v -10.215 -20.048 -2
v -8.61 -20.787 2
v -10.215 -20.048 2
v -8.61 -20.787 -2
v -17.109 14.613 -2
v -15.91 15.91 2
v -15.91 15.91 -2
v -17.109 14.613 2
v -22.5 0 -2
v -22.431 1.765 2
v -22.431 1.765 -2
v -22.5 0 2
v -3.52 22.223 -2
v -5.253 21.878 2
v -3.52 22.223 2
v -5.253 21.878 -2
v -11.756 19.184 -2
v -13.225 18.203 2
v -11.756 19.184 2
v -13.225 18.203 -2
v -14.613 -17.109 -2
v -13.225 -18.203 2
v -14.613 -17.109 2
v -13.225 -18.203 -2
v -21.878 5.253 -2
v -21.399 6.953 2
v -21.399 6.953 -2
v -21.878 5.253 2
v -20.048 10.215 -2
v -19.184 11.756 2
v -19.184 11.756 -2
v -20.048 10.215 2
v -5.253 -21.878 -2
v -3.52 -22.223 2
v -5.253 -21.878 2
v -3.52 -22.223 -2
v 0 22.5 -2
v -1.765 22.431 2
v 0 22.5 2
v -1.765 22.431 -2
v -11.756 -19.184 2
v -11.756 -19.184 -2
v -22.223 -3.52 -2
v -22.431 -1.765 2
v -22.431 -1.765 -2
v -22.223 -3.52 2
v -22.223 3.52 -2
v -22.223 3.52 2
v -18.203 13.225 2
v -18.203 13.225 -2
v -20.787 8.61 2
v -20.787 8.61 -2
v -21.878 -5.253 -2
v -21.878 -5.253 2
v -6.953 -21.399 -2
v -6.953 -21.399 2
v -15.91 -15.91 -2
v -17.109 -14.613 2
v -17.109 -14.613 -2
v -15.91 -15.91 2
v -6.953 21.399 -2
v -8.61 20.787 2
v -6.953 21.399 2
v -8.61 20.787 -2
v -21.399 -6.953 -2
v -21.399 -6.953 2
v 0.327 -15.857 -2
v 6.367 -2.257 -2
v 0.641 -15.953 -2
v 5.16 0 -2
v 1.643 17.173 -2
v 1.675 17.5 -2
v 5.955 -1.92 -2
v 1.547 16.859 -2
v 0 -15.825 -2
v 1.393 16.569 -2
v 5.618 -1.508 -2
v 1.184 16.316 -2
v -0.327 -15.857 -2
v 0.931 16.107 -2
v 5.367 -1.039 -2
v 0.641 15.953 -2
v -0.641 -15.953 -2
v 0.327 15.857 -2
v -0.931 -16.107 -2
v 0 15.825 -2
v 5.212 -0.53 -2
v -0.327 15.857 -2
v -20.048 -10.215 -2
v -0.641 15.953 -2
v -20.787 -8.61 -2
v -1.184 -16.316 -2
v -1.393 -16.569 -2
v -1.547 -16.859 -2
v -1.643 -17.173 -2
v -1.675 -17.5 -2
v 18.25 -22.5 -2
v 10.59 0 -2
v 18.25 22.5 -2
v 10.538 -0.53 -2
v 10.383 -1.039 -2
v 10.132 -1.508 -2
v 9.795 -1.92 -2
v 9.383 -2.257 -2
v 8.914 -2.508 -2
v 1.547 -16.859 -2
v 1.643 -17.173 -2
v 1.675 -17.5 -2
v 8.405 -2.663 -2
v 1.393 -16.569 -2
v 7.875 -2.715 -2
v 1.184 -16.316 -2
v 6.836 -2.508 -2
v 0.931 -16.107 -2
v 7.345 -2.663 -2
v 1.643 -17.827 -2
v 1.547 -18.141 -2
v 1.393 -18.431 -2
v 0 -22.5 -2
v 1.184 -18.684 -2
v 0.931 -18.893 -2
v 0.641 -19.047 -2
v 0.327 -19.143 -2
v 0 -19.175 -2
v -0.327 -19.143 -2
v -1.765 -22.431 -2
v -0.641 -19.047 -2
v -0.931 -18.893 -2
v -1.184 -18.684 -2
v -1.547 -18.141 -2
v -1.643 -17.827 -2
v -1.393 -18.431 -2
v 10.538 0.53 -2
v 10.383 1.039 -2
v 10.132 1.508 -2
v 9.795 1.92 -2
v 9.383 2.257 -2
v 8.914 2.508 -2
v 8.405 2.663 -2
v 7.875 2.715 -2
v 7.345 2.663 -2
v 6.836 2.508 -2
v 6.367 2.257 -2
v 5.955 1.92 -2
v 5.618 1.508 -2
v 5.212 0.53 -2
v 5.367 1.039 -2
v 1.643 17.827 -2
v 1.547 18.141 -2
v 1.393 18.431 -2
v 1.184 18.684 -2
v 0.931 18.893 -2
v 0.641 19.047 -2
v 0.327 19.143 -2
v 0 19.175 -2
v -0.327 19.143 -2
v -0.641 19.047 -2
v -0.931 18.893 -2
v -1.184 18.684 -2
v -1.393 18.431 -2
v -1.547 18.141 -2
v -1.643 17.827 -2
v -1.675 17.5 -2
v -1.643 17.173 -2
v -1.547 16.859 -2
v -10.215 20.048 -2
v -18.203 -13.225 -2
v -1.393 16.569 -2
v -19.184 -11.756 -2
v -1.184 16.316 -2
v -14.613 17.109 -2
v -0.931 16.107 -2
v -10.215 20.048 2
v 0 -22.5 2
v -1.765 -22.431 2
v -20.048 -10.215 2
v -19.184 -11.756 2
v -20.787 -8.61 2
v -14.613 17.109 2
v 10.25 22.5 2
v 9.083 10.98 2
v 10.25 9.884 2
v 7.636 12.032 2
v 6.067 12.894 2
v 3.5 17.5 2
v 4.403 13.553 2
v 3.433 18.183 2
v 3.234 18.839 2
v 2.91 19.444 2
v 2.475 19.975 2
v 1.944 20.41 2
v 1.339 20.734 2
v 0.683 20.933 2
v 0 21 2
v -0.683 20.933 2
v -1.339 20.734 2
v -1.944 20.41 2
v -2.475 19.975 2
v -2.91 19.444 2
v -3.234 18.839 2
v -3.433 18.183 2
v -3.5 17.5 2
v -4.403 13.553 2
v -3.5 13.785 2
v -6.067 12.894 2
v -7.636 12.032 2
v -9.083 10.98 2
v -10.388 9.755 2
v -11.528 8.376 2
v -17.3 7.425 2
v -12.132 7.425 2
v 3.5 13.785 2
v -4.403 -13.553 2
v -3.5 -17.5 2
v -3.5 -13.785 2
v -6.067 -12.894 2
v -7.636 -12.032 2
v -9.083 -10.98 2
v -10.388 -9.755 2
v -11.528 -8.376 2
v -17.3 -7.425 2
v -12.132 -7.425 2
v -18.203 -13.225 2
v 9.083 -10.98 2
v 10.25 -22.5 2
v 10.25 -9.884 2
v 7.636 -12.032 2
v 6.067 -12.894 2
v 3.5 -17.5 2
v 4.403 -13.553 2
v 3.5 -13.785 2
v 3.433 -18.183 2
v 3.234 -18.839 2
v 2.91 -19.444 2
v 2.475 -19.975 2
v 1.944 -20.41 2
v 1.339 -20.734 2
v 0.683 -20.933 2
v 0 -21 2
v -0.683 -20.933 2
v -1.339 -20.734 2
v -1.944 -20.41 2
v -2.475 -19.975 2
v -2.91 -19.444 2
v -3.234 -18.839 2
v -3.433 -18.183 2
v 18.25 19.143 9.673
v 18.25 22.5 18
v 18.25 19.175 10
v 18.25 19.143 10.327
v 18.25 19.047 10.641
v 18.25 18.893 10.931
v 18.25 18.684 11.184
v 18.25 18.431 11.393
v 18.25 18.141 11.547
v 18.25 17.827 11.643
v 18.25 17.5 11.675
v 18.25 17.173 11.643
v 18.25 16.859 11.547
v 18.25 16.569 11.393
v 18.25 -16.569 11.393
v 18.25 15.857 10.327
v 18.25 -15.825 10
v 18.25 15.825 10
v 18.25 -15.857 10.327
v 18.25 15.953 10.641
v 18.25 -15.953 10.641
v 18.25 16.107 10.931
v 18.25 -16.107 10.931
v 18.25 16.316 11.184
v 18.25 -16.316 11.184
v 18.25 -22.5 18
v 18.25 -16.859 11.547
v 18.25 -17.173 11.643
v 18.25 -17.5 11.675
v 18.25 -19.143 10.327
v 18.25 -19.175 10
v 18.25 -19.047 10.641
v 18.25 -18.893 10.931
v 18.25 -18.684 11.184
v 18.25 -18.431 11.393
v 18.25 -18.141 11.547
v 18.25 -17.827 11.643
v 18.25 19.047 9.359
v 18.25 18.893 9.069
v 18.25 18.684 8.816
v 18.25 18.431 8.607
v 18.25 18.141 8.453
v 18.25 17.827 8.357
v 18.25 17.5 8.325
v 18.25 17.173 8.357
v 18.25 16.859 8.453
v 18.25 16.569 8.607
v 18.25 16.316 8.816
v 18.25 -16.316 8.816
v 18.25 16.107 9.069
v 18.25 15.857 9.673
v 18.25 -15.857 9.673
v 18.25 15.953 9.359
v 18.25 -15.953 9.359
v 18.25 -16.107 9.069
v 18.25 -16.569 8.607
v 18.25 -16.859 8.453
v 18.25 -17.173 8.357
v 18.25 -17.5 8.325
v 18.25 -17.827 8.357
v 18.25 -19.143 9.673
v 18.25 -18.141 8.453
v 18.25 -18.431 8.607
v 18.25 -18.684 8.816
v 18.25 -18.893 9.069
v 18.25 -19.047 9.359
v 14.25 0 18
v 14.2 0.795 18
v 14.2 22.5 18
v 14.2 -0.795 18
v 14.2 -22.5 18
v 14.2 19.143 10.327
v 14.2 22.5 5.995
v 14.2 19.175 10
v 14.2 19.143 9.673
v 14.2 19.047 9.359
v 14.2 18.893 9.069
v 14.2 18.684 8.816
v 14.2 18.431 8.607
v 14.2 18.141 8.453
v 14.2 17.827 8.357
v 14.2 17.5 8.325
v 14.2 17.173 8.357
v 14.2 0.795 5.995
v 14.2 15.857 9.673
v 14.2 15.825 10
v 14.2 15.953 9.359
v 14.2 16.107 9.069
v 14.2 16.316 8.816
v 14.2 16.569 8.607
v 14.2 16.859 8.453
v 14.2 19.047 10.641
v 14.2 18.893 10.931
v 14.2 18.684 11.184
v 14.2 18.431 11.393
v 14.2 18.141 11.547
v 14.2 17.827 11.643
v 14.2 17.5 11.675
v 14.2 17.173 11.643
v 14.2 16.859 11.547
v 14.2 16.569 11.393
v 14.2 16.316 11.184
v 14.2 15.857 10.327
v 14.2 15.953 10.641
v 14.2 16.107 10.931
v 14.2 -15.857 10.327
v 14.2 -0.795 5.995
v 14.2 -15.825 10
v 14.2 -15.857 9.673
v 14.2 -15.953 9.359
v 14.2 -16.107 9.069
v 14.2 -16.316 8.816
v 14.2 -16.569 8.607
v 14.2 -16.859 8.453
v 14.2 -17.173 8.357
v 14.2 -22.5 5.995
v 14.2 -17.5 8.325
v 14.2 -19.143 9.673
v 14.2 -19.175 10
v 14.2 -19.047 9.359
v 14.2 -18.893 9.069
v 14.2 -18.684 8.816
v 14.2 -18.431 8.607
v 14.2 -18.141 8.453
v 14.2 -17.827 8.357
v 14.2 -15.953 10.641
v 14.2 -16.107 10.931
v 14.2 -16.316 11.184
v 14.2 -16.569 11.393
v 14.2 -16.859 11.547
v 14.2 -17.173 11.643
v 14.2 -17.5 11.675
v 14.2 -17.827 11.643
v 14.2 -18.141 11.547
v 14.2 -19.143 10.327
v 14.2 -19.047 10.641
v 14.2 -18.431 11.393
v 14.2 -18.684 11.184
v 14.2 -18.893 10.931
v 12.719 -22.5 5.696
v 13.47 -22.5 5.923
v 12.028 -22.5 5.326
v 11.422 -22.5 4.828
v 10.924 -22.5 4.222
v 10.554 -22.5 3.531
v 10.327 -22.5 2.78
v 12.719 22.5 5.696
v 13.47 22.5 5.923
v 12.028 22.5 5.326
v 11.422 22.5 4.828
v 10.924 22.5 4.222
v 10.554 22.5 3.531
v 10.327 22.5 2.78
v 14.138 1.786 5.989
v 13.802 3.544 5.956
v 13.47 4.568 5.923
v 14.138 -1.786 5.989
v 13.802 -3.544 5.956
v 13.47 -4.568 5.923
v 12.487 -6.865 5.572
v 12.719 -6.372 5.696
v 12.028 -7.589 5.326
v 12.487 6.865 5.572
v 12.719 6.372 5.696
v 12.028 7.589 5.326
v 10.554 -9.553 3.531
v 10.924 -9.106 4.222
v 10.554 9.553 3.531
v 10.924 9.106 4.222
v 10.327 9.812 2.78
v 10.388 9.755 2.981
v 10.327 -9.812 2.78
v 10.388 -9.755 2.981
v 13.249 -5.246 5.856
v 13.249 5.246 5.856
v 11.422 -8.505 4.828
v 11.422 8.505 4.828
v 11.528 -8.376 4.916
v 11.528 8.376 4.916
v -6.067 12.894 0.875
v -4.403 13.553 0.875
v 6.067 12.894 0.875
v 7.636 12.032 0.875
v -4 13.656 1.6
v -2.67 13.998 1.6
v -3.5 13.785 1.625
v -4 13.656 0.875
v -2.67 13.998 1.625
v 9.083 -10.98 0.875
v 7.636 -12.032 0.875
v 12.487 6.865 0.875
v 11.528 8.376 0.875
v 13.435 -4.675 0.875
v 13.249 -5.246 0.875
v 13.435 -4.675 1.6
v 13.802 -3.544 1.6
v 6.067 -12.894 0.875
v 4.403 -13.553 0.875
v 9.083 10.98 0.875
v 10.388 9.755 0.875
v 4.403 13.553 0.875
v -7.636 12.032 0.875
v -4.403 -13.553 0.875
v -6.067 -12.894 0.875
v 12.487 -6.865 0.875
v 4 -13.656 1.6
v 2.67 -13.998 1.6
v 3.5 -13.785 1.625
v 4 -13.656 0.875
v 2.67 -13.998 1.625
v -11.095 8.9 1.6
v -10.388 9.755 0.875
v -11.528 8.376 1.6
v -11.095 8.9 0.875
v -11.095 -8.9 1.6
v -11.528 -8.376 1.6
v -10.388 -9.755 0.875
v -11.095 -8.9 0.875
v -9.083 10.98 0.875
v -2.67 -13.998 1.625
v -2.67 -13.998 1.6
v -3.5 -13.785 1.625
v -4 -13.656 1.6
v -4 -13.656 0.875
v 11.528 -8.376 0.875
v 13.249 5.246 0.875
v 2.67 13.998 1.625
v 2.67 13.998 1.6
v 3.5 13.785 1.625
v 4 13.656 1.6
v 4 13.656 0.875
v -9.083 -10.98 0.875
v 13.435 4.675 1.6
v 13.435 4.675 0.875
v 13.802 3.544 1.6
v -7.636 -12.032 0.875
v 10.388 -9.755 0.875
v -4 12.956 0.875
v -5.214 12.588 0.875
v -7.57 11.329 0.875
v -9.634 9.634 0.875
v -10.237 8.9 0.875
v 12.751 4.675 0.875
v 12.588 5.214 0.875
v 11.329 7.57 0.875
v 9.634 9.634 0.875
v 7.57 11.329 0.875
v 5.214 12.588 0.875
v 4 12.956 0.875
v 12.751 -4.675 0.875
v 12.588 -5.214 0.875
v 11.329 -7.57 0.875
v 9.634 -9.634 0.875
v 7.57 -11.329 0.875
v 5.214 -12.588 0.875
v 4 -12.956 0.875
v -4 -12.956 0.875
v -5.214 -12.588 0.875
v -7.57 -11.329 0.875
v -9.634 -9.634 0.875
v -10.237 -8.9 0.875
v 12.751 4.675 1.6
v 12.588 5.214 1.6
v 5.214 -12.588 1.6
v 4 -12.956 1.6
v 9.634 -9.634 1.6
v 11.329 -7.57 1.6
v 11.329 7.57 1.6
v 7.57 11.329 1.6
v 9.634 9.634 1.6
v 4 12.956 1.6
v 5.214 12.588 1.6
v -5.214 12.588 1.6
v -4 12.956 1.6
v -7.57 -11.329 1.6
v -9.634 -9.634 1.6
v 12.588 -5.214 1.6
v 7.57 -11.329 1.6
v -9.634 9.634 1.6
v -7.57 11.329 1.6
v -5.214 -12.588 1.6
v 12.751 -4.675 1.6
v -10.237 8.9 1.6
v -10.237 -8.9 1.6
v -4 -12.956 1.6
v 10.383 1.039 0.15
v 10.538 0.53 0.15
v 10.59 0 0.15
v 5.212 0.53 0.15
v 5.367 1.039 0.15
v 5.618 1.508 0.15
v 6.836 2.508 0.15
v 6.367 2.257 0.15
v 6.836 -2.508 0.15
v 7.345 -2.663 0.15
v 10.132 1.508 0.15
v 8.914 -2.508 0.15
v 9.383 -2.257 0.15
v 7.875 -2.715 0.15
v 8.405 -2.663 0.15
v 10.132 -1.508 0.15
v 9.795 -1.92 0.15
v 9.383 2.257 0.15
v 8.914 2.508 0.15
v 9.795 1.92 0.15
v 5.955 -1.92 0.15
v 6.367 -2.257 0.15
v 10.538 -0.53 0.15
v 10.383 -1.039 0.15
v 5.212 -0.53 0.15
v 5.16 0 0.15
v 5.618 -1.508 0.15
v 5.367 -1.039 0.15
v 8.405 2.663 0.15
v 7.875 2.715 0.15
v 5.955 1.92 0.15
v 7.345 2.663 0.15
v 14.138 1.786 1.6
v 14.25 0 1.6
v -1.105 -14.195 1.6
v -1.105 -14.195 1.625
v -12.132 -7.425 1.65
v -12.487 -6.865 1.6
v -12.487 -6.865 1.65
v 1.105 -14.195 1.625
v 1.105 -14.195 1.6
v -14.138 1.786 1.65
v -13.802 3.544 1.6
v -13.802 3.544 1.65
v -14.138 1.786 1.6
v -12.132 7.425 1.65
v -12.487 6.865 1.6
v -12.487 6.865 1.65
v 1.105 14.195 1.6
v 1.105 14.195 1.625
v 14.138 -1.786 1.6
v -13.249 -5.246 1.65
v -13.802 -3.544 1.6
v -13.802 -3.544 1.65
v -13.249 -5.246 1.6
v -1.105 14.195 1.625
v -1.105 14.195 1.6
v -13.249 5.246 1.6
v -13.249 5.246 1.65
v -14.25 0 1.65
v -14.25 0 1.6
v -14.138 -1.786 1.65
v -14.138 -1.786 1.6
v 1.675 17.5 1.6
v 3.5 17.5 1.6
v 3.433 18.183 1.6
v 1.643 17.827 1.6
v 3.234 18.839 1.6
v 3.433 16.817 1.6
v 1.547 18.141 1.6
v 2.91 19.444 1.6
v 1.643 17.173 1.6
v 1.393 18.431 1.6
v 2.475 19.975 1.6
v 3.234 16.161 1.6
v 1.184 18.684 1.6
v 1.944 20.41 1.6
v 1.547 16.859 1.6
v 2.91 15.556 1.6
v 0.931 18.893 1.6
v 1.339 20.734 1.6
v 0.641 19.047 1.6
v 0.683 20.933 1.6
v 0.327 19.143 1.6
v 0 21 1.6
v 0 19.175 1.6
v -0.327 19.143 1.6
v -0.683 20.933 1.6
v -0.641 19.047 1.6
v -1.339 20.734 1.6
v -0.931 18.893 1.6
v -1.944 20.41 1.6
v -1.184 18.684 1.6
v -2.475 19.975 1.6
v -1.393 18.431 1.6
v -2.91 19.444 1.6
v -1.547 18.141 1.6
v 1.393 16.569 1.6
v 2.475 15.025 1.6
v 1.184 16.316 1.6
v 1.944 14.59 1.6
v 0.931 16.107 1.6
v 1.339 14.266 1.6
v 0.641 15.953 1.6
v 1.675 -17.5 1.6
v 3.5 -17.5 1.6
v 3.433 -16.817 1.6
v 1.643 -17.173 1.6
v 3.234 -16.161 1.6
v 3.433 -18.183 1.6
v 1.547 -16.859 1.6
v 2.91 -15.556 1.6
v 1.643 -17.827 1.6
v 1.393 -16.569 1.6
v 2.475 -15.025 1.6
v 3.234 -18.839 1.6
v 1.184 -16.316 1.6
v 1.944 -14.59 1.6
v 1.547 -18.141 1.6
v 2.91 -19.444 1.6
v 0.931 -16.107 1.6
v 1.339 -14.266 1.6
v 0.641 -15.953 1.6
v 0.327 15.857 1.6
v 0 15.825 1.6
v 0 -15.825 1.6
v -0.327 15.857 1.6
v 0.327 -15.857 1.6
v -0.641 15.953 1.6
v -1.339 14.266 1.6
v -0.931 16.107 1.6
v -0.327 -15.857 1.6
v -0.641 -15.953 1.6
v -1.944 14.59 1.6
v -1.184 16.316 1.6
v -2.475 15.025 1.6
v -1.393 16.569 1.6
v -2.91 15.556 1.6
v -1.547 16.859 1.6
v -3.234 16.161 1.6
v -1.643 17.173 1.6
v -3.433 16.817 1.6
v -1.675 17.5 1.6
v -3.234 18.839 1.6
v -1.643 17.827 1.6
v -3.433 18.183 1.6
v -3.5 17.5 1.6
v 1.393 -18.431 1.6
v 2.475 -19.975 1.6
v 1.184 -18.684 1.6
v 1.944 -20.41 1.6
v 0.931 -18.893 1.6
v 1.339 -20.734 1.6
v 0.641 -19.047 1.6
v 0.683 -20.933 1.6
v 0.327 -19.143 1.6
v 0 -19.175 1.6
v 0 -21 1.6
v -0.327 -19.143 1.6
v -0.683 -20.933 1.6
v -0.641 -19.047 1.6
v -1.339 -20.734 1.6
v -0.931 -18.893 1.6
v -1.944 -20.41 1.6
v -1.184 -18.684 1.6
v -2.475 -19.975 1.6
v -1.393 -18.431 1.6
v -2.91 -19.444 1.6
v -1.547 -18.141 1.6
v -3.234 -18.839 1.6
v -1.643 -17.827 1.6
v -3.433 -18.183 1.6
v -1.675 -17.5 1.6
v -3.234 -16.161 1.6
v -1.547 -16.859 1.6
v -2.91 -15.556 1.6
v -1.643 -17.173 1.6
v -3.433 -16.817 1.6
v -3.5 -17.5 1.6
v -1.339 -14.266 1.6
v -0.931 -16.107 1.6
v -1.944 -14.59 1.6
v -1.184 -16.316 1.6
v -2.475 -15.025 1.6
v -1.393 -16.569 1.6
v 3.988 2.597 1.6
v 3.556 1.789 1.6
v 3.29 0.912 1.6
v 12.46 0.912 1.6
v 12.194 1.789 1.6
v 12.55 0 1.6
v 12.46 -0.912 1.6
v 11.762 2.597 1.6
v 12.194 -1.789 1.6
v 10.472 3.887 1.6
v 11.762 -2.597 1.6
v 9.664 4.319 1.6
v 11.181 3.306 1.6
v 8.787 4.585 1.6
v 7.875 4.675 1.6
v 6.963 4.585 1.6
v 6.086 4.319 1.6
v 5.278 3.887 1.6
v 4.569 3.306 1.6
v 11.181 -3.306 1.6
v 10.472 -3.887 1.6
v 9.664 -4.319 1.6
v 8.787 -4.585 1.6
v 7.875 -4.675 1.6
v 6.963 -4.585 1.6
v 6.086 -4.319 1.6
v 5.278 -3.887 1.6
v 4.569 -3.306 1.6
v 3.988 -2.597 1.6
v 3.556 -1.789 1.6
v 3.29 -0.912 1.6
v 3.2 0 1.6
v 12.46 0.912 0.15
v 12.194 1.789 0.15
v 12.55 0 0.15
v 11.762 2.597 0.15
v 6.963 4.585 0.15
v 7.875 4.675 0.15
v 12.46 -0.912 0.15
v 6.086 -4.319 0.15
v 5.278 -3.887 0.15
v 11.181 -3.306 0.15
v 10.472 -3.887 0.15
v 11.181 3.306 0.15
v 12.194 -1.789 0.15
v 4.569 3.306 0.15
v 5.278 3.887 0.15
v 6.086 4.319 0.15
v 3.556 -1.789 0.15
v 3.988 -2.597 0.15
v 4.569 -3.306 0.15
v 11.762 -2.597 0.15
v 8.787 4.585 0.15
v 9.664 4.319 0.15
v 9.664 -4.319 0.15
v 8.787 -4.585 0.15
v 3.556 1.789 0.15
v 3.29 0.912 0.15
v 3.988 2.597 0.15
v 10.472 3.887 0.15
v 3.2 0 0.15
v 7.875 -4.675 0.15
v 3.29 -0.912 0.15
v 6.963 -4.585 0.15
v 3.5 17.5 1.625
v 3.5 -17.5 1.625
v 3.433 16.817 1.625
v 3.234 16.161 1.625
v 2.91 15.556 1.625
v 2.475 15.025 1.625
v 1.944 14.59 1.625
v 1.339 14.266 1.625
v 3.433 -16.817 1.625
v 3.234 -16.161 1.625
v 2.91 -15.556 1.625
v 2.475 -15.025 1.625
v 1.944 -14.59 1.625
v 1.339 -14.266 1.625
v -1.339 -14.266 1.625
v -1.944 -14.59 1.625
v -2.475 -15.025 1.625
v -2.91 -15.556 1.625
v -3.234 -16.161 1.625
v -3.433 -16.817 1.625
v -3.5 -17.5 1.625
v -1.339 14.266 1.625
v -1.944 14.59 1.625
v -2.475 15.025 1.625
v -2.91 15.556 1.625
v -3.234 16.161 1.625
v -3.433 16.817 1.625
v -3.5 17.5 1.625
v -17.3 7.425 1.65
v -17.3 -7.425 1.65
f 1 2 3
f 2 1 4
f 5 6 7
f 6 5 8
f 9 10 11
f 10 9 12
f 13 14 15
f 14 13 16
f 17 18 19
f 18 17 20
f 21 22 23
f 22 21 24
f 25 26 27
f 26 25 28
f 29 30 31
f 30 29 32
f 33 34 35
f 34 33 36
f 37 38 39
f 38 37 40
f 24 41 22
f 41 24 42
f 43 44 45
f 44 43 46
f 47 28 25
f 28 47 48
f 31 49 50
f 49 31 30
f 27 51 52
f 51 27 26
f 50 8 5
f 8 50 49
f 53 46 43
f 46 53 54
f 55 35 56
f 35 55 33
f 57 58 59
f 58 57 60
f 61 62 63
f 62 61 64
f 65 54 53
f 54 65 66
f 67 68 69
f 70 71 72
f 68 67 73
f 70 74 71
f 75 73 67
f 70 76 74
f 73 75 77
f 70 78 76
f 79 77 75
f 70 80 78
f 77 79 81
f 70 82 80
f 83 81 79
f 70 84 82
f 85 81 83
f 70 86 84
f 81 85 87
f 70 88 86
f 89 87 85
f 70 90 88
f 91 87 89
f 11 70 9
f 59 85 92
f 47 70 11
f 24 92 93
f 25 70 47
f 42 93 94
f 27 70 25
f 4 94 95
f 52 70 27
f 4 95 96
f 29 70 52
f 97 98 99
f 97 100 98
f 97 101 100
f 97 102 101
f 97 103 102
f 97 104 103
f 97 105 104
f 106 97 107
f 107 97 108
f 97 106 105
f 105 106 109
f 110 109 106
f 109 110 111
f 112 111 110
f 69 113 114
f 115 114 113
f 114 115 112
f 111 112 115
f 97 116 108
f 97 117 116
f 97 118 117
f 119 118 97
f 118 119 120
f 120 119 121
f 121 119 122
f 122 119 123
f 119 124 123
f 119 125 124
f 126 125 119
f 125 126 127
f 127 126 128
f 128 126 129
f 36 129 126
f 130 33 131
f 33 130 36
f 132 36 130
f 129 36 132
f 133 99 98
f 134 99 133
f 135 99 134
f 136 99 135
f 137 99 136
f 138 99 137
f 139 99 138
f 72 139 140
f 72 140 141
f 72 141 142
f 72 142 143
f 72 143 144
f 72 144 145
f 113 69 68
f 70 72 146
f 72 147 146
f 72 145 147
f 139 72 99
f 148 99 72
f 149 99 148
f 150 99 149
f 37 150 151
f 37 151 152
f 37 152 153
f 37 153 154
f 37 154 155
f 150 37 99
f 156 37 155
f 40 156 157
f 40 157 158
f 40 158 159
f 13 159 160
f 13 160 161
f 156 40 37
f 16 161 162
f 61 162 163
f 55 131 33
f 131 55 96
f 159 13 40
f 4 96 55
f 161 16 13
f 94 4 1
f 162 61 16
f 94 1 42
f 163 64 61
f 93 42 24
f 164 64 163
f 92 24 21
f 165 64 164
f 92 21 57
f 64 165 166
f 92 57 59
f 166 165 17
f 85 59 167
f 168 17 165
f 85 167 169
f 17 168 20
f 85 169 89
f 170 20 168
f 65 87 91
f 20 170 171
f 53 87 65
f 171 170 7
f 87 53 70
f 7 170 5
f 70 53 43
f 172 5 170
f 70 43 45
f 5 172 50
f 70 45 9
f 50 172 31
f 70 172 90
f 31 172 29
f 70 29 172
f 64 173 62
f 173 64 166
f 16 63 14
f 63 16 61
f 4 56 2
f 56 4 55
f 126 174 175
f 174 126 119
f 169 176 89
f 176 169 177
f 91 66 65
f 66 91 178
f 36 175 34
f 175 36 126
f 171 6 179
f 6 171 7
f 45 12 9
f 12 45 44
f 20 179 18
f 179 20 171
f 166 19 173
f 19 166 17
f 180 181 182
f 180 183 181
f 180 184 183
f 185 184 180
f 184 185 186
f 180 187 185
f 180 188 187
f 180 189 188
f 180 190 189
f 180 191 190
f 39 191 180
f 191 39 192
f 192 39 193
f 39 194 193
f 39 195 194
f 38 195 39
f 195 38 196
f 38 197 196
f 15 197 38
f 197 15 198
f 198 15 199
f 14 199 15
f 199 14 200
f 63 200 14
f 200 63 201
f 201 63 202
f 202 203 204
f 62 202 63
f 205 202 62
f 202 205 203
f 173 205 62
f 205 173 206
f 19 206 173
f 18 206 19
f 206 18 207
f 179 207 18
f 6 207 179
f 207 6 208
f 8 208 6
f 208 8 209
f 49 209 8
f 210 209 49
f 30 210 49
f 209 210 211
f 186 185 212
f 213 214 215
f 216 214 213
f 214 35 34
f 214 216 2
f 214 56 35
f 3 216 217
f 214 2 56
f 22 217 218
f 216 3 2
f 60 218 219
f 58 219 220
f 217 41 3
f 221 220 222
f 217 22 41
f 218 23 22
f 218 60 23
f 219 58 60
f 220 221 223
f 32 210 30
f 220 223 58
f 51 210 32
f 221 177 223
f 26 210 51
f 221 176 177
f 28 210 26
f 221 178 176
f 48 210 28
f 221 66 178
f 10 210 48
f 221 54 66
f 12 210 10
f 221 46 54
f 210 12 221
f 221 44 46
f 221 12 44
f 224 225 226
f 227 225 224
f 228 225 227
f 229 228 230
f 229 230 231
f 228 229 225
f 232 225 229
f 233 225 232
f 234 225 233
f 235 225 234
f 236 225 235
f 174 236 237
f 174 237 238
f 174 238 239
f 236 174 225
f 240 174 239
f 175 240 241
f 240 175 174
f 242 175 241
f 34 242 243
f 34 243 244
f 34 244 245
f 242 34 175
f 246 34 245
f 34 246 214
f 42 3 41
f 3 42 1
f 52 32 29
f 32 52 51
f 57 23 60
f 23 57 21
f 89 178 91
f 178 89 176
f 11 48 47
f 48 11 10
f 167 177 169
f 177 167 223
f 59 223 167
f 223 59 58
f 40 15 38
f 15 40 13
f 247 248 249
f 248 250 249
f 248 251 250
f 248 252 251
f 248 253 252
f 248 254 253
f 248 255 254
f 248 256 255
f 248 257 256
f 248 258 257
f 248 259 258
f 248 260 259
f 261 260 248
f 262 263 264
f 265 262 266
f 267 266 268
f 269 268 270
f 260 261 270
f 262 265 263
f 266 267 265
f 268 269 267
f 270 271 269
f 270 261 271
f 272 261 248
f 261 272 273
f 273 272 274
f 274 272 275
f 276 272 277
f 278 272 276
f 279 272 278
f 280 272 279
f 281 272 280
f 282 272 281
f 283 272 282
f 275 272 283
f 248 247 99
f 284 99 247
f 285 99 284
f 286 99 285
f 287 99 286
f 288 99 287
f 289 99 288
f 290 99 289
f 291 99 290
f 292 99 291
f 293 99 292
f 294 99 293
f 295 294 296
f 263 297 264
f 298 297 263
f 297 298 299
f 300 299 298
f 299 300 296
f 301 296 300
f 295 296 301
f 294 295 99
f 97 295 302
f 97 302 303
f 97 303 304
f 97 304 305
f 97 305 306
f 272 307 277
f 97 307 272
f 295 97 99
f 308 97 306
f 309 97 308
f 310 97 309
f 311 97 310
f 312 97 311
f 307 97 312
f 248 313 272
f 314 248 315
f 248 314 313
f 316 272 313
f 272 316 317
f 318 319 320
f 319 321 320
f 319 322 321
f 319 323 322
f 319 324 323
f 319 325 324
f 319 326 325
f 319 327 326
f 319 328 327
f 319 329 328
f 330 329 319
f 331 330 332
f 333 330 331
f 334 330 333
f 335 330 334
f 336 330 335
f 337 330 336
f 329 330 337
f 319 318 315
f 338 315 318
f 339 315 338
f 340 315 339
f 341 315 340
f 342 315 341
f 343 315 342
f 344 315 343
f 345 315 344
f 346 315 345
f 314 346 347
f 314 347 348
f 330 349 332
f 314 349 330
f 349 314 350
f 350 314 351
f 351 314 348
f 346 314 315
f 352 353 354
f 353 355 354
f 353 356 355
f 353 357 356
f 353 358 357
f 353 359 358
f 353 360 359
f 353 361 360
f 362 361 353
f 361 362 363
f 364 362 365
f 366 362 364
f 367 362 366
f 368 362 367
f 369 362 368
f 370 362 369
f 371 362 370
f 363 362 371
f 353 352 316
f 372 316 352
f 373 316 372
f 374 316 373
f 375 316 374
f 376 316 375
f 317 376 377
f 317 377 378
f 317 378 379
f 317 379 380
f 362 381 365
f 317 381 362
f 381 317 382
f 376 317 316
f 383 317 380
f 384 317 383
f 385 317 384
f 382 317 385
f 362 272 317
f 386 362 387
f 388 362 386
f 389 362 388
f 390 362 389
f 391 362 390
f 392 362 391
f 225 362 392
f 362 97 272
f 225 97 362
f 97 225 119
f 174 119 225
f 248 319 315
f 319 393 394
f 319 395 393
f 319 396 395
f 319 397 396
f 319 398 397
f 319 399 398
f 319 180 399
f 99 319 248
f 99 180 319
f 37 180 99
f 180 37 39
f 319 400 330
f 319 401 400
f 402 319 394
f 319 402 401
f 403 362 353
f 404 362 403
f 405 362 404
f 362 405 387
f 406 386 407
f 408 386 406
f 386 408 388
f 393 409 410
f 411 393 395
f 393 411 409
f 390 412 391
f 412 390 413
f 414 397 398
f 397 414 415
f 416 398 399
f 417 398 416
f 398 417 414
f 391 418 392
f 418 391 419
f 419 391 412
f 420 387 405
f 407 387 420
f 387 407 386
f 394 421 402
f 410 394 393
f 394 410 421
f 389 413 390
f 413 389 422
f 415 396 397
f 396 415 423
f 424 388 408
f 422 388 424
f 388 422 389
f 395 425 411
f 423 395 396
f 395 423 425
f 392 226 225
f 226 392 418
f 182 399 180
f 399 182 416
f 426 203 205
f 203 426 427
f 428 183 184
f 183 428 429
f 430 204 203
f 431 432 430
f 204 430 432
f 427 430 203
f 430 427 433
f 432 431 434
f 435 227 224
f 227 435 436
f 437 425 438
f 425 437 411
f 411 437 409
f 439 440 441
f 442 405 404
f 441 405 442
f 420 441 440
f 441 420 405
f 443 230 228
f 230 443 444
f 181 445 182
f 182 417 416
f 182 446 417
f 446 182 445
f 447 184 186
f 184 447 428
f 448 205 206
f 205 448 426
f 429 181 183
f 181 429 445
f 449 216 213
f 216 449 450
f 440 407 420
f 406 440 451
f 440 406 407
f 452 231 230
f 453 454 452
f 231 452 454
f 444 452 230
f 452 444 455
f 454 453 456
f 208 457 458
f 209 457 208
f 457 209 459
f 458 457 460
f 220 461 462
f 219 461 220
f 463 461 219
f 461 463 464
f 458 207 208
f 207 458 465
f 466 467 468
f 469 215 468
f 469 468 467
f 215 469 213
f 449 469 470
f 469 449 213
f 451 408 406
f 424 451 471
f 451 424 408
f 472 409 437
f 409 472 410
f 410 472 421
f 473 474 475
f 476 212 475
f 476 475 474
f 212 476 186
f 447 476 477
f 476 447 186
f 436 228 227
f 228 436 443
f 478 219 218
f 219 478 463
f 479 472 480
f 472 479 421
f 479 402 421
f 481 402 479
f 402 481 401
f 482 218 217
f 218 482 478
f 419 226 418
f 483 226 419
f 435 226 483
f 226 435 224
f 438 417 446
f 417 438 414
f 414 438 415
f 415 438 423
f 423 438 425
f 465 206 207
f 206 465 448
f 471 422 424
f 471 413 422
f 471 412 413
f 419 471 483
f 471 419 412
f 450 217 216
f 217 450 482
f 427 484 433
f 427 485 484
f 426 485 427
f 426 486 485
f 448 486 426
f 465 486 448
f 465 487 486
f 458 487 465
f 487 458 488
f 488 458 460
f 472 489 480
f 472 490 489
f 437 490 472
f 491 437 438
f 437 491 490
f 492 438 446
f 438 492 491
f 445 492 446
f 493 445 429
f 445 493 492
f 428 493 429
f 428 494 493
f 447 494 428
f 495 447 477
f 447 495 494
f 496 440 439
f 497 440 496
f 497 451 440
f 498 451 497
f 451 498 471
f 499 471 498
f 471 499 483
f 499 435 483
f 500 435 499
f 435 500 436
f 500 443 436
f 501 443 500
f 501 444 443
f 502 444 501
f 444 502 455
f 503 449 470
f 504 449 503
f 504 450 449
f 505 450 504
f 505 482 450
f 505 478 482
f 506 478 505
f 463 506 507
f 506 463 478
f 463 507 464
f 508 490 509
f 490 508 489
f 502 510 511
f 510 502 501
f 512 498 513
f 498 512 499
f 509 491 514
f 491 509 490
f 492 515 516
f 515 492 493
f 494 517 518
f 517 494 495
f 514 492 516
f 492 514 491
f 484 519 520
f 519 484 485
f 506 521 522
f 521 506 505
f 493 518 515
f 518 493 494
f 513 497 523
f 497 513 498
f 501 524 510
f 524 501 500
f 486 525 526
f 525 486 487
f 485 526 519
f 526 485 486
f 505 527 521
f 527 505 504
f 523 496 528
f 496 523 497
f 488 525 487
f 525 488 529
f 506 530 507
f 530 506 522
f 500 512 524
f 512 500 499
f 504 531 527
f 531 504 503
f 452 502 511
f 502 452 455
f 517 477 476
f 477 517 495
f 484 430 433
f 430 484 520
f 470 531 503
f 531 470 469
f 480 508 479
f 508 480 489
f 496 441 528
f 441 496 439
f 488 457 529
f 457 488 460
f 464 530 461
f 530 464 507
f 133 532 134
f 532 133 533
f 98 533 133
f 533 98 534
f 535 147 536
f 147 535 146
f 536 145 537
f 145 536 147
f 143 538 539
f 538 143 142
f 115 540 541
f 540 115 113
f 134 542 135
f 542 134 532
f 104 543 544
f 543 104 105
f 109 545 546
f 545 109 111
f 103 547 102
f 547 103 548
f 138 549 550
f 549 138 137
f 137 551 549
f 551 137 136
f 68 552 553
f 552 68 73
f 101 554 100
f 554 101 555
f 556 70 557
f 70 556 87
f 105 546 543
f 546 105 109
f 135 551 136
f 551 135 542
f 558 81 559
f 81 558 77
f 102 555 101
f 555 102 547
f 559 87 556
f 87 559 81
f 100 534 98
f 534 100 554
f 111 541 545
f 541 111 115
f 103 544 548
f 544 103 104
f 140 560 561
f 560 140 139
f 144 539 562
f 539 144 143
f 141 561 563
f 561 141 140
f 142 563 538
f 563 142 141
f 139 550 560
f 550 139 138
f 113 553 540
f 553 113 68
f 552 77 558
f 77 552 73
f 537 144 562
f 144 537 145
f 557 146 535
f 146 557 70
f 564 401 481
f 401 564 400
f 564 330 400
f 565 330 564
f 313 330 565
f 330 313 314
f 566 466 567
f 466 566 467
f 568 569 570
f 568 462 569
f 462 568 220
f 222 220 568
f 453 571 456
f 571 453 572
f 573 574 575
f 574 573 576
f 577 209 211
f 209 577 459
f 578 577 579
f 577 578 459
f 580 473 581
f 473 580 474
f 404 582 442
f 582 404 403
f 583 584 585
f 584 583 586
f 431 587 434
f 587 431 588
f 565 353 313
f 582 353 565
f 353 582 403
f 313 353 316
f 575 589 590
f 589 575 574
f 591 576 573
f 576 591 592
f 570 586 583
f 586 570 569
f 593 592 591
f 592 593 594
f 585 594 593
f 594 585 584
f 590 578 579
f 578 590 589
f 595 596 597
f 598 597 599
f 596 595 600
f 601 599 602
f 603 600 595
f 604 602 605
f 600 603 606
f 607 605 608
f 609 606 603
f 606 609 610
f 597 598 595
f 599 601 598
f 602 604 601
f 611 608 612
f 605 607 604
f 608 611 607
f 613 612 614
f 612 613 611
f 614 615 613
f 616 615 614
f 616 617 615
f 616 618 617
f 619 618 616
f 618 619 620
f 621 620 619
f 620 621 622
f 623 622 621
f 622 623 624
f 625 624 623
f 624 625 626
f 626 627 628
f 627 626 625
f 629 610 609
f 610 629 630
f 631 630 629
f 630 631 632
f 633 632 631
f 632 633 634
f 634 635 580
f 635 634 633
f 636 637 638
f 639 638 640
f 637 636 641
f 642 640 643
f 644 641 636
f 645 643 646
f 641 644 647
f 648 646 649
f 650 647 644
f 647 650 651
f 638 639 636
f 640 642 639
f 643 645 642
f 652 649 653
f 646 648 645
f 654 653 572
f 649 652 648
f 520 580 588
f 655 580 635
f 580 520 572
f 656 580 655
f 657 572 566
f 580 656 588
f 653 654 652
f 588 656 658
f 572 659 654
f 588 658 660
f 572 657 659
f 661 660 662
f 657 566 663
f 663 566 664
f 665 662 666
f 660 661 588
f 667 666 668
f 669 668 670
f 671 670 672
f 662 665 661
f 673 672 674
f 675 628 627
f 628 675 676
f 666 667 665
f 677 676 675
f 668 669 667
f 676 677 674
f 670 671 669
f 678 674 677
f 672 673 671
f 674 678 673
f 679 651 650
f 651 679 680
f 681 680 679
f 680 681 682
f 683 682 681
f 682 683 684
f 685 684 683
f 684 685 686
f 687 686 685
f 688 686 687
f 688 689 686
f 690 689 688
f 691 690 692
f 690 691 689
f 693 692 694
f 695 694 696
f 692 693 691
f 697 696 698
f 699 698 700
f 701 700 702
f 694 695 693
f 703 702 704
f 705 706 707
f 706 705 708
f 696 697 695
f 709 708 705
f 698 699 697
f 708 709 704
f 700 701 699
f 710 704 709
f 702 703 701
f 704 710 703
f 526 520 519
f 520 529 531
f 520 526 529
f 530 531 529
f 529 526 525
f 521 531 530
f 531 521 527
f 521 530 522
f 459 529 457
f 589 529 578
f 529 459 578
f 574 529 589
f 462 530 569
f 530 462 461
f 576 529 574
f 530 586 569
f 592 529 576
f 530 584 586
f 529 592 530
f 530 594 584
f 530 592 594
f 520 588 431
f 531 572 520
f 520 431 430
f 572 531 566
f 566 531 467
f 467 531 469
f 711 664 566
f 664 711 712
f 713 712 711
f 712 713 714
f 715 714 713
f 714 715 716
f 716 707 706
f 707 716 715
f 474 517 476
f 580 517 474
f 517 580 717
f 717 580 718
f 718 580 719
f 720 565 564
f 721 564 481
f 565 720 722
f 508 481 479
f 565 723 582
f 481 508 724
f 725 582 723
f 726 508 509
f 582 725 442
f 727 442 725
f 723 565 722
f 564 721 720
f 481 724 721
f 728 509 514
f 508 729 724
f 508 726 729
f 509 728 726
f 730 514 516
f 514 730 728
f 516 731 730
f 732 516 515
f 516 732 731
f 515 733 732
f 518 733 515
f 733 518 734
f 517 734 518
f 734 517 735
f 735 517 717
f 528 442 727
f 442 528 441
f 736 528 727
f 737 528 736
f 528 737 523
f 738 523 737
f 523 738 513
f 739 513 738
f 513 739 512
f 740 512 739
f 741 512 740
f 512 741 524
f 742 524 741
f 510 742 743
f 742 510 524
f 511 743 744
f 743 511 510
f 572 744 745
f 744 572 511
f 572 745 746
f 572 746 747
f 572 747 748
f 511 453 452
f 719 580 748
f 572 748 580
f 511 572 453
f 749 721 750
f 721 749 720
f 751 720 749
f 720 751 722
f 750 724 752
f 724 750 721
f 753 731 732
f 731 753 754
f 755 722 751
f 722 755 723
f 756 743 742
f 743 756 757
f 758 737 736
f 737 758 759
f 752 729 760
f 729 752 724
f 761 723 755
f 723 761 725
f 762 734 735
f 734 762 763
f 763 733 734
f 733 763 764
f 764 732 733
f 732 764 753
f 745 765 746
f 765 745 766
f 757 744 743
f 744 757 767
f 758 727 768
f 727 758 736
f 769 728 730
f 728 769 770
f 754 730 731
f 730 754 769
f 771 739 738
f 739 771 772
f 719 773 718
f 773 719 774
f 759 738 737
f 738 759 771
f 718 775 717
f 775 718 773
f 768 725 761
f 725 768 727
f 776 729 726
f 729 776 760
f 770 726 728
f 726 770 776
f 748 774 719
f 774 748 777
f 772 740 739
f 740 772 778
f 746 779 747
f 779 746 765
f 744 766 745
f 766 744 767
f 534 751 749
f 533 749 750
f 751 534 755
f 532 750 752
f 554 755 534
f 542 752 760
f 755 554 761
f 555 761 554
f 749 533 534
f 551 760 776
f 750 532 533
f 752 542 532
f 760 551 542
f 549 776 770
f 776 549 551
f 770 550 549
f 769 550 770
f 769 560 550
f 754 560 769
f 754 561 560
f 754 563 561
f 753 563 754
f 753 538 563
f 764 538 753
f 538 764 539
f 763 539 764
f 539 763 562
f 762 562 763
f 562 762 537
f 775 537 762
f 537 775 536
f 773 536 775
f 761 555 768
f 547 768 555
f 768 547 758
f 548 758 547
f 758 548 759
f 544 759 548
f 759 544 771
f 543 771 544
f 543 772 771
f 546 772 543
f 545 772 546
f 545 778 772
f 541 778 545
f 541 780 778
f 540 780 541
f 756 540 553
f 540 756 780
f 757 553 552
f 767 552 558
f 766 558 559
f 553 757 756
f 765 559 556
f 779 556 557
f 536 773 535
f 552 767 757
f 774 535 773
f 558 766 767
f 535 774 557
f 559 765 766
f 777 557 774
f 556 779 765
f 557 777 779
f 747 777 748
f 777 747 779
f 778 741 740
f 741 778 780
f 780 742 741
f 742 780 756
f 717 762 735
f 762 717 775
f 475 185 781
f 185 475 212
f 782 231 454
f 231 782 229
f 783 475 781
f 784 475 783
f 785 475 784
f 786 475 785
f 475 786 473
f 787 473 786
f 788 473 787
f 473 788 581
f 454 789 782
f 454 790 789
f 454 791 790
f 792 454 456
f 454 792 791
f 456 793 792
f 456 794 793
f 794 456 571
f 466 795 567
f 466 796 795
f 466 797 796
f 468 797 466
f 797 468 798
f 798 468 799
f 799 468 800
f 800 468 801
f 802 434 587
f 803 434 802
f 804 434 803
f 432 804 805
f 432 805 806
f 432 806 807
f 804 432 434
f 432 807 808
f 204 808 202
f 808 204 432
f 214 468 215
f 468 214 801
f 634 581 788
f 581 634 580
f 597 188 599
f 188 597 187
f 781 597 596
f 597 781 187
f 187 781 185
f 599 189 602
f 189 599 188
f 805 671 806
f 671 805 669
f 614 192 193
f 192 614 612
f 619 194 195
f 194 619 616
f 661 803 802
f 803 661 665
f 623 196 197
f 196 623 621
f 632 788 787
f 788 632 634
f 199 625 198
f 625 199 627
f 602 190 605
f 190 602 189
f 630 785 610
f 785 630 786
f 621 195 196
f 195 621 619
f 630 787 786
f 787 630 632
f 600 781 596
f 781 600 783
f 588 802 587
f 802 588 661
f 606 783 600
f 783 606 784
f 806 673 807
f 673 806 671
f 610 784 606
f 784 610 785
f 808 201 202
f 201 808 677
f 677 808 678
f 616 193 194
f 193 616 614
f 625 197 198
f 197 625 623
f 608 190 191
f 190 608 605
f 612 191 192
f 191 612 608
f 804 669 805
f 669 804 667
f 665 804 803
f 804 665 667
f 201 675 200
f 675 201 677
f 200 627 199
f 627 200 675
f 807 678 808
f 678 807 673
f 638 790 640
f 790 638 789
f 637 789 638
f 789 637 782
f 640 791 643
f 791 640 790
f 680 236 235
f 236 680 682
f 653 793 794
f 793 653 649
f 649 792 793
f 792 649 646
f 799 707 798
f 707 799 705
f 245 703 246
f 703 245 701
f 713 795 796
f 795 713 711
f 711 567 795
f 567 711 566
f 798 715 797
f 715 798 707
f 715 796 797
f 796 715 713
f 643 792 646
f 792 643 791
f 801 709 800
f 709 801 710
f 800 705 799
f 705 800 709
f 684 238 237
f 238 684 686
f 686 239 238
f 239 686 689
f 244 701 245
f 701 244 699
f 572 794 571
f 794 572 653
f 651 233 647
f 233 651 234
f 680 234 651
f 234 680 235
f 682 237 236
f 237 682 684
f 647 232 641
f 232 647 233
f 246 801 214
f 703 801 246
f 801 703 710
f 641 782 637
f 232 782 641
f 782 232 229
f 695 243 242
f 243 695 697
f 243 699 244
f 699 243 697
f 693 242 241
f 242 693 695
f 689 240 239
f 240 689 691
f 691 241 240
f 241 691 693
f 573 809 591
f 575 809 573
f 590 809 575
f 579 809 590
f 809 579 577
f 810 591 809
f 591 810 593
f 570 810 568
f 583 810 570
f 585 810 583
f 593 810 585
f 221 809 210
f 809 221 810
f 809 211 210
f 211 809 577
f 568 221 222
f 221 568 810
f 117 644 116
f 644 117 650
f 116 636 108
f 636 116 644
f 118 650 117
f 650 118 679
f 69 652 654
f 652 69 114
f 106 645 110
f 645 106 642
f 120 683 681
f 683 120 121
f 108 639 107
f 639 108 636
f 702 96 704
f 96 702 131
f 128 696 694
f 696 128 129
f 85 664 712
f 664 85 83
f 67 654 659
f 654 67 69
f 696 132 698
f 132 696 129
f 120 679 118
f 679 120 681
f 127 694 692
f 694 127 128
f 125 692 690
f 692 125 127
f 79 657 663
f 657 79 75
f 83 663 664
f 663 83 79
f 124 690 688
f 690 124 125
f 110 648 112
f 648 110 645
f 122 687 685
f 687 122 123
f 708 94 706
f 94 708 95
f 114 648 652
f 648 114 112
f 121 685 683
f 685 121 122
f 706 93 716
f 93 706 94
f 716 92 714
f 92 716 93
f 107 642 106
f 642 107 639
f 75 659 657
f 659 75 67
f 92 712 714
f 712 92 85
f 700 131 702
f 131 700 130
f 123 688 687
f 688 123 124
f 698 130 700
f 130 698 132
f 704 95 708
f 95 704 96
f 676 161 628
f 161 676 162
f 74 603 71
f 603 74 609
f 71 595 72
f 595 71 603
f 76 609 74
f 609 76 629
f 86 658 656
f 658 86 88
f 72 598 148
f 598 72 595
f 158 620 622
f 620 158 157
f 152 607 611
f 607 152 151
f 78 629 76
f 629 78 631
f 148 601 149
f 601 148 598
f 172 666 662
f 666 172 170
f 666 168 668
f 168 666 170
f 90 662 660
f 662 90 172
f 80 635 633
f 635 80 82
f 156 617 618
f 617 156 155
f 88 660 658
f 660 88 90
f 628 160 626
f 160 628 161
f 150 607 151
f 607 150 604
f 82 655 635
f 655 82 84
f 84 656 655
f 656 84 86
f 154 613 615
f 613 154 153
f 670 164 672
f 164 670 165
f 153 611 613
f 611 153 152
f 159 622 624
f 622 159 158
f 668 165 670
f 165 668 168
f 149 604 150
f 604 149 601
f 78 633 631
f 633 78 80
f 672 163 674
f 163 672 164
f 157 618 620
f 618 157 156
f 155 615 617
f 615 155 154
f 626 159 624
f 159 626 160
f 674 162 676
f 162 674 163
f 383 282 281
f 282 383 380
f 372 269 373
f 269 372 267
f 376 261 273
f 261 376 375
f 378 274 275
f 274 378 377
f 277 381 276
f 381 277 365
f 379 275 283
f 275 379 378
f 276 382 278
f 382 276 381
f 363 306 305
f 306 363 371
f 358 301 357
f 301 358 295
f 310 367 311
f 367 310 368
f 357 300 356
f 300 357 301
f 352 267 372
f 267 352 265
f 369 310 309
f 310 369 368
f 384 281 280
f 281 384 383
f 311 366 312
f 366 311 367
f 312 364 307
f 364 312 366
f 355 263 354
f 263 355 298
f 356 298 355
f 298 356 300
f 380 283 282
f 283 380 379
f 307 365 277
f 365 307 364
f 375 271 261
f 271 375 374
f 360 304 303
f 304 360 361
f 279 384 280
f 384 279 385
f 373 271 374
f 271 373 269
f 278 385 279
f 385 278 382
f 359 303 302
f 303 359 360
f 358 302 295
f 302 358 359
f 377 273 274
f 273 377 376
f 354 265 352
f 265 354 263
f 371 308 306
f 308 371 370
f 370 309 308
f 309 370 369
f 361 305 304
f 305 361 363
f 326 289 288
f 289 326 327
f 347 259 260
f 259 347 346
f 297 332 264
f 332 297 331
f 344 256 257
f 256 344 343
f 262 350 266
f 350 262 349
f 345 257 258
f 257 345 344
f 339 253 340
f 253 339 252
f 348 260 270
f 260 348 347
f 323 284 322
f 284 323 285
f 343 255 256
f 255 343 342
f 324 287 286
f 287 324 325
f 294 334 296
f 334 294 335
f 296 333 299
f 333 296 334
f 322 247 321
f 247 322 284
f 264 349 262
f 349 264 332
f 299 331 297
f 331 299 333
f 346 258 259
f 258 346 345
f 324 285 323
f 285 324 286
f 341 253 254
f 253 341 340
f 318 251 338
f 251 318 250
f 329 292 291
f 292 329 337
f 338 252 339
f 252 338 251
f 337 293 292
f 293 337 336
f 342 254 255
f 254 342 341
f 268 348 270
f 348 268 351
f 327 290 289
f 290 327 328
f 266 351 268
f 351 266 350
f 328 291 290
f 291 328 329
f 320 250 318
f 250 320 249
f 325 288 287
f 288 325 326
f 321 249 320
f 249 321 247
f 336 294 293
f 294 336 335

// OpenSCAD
// Bracket for  28BYJ-48 stepper motor
// 28BYJ-48 model from RGriffoGoes www.thingiverse.com/thing:204734
// added details by J.Beale 21 July 2014
// Bracket by J.Beale 9 Aug 2014

slop = 0.25;  // printer tolerance

// =========================================================
// stepper motor body model

MBH = 18.8;   // motor body height
MBD = 28.25+slop;  // motor body OD
SBD = 9.1+slop;    // shaft boss OD
SBH = 1.45;   // shaft boss height above motor body
SBO = 7.875;  // offset of shaft/boss center from motor center
SHD = 4.93+slop*2;   // motor shaft OD+ countersink for boss
//SHD = 11.9+slop;   // motor shaft OD (larger clearance hole)
SHDF = 3.0;   // motor shaft diameter, across flats
SHHF = 6.0;   // motor shaft flats height, or depth in from end
SHHF = 0.0;   // assume round shaft for purposes of bracket
SHH = 9.75;   // height of shaft above motor body 

MBFH = 0.7;   // height of body edge flange protruding above surface
MBFW = 1.0+slop;   // width of edge flange
MBFNW = 8;    // width of notch in edge flange
MBFNW2 = 17.8;  // width of edge flange notch above wiring box

MHCC = 35.0;  // mounting hole center-to-center
MTH  = 0.8;   // mounting tab thickness
MTW  = 7.0;   // mounting tab width
//MTHID = 4.0;  // mounting tab hole inner diameter
MTHID = 3.0;  // mounting tab hole inner diameter
WBH  = 16.7;  // plastic wiring box height
WBW  = 14.6+slop;  // plastic wiring box width
WBD  = 31.3+slop;  // body diameter to outer surface of wiring box

WRD = 1.0;     // diameter of electrical wires
WRL = 30;      // length of electrical wires
WRO = 2.2;		// offset of wires below top motor surface
// =========================================================
// right-angle bracket for motor

MSOD = 5.9 + slop;  // M3 mounting screw head diameter
// MSTH = 2.0;  // M3 screw head thickness (for countersink)
MSTH = 0; // set to zero for no screwhead countersink
MSSD = 3.1 + slop;  // M3 screw diameter clearance hole
Bthick = 4;  // thickness of bracket
Bdia = (MHCC+10);  // diameter of bracket face

// =========================================================
fn = 80;
eps = 0.05;   // small number to avoid coincident faces


module StepMotor28BYJ()
{
  difference(){
    union(){
	   color("gray") translate([0,0,-(MBH+MBFH)/2])
		  difference() {  // flange at top rim
         cylinder(h = MBFH+eps, r = MBD/2, center = true, $fn = 50);
         cylinder(h = MBFH+2*eps, r = (MBD-MBFW)/2, center = true, $fn = 32);
			cube([MBFNW,MHCC,MBFH*2],center=true); // notches in rim
			cube([MBD+2*MBFW,SBD,MBFH*2],center=true);
		   translate([-MBD/2,0,0]) cube([MBD,MBFNW2,MBFH*2],center=true);
        }
		color("gray") // motor body
			cylinder(h = MBH, r = MBD/2, center = true, $fn = 50);
		color("gray") translate([SBO,0,-SBH])	// shaft boss
			cylinder(h = MBH, r = SBD/2, center = true, $fn = 32);

		translate([SBO,0,-SHH])	// motor shaft
        difference() {
			color("gold") cylinder(h = MBH, r = SHD/2, center = true, $fn = 32);
				// shaft flats
		   color("red") translate([(SHD+SHDF)/2,0,-(eps+MBH-SHHF)/2]) 
				cube([SHD,SHD,SHHF], center = true);
		   color("red") translate([-(SHD+SHDF)/2,0,-(eps+MBH-SHHF)/2]) 
				cube([SHD,SHD,SHHF], center = true);
        }


		color("Silver") translate([0,0,-(MBH-MTH-eps)/2]) // mounting tab 
			cube([MTW,MHCC,MTH], center = true);				
		color("Silver") translate([0,MHCC/2,-(MBH-MTH)/2]) // mt.tab rounded end
			cylinder(h = MTH, r = MTW/2, center = true, $fn = 32);
		color("Silver") translate([0,-MHCC/2,-(MBH-MTH)/2]) // mt.tab rounded end
			cylinder(h = MTH, r = MTW/2, center = true, $fn = 32);


		color("blue") translate([-(WBD-MBD),0,eps-(MBH-WBH)/2]) // plastic wire box
			cube([MBD,WBW,WBH], center = true);
	   color("blue") translate([-2,0,0])	
			cube([24.5,16,15], center = true);
		}

				// mounting holes in tabs on side
		color("red") translate([0,MHCC/2,-MBH/2])	
				cylinder(h = 2, r = MTHID/2, center = true, $fn = 32);
		color("red") translate([0,-MHCC/2,-MBH/2])	
				cylinder(h = 2, r = MTHID/2, center = true, $fn = 32);
		}
}

module MOT() {
 translate([0,0,-MBH/2]) 
 rotate([180,0,0]) StepMotor28BYJ();  // motor body (without wires)
}


module bracket() {
difference() {
 union() {
  translate([0,0,-2]) cylinder(h=Bthick, r=Bdia/2, $fn=fn);  // round face
  translate([-eps + MBD/2,-Bdia/2,-20+Bthick/2]) 
		cube([4+eps,Bdia,20]); // flange
  translate([-0,-Bdia/2,-Bthick/2]) 
	cube([Bdia,Bdia,Bthick]); // square edge joining round face to flange
  translate([MBD/2,Bdia/2,-Bthick/2]) rotate([90,0,0]) 
	cylinder(r=Bthick,h=Bdia,$fn=32); // round fillet at flange
 }
 union() {
   translate([4+MBD/2,-MBD,-MBD]) cube([MBD*2,MBD*2,MBD*2]);
   translate([0,MHCC/2,-10])	// motor mounting bolt
				cylinder(h = 30, r = MSSD/2, center = true, $fn = 32);
   translate([0,-MHCC/2,-10])	// motor mounting bole
				cylinder(h = 30, r = MSSD/2, center = true, $fn = 32);
   translate([10,MHCC/2,-10]) rotate([0,90,0]) 	// flange mounting bolt
				cylinder(h = 30, r = MSSD/2, center = true, $fn = 32);
   translate([10,-MHCC/2,-10]) rotate([0,90,0]) 	// flange mounting bolt
				cylinder(h = 30, r = MSSD/2, center = true, $fn = 32);

   color("white") translate([0,MHCC/2,((Bthick/2) - MSTH + eps)]) 
	 cylinder(r=MSOD/2, h=MSTH, $fn=25); // motor screw countersink
   color("white") translate([0,-MHCC/2,((Bthick/2) - MSTH + eps)])  
	 cylinder(r=MSOD/2, h=MSTH, $fn=25); // motor screw countersink

   translate([0,0,-1.6]) MOT(); // body of motor
   //translate([0,0,-10]) cube([50,50,50]); // DEBUG cutaway view
 }
}
} // end module()

rotate([180,0,0]) bracket();  // show the motor bracket
